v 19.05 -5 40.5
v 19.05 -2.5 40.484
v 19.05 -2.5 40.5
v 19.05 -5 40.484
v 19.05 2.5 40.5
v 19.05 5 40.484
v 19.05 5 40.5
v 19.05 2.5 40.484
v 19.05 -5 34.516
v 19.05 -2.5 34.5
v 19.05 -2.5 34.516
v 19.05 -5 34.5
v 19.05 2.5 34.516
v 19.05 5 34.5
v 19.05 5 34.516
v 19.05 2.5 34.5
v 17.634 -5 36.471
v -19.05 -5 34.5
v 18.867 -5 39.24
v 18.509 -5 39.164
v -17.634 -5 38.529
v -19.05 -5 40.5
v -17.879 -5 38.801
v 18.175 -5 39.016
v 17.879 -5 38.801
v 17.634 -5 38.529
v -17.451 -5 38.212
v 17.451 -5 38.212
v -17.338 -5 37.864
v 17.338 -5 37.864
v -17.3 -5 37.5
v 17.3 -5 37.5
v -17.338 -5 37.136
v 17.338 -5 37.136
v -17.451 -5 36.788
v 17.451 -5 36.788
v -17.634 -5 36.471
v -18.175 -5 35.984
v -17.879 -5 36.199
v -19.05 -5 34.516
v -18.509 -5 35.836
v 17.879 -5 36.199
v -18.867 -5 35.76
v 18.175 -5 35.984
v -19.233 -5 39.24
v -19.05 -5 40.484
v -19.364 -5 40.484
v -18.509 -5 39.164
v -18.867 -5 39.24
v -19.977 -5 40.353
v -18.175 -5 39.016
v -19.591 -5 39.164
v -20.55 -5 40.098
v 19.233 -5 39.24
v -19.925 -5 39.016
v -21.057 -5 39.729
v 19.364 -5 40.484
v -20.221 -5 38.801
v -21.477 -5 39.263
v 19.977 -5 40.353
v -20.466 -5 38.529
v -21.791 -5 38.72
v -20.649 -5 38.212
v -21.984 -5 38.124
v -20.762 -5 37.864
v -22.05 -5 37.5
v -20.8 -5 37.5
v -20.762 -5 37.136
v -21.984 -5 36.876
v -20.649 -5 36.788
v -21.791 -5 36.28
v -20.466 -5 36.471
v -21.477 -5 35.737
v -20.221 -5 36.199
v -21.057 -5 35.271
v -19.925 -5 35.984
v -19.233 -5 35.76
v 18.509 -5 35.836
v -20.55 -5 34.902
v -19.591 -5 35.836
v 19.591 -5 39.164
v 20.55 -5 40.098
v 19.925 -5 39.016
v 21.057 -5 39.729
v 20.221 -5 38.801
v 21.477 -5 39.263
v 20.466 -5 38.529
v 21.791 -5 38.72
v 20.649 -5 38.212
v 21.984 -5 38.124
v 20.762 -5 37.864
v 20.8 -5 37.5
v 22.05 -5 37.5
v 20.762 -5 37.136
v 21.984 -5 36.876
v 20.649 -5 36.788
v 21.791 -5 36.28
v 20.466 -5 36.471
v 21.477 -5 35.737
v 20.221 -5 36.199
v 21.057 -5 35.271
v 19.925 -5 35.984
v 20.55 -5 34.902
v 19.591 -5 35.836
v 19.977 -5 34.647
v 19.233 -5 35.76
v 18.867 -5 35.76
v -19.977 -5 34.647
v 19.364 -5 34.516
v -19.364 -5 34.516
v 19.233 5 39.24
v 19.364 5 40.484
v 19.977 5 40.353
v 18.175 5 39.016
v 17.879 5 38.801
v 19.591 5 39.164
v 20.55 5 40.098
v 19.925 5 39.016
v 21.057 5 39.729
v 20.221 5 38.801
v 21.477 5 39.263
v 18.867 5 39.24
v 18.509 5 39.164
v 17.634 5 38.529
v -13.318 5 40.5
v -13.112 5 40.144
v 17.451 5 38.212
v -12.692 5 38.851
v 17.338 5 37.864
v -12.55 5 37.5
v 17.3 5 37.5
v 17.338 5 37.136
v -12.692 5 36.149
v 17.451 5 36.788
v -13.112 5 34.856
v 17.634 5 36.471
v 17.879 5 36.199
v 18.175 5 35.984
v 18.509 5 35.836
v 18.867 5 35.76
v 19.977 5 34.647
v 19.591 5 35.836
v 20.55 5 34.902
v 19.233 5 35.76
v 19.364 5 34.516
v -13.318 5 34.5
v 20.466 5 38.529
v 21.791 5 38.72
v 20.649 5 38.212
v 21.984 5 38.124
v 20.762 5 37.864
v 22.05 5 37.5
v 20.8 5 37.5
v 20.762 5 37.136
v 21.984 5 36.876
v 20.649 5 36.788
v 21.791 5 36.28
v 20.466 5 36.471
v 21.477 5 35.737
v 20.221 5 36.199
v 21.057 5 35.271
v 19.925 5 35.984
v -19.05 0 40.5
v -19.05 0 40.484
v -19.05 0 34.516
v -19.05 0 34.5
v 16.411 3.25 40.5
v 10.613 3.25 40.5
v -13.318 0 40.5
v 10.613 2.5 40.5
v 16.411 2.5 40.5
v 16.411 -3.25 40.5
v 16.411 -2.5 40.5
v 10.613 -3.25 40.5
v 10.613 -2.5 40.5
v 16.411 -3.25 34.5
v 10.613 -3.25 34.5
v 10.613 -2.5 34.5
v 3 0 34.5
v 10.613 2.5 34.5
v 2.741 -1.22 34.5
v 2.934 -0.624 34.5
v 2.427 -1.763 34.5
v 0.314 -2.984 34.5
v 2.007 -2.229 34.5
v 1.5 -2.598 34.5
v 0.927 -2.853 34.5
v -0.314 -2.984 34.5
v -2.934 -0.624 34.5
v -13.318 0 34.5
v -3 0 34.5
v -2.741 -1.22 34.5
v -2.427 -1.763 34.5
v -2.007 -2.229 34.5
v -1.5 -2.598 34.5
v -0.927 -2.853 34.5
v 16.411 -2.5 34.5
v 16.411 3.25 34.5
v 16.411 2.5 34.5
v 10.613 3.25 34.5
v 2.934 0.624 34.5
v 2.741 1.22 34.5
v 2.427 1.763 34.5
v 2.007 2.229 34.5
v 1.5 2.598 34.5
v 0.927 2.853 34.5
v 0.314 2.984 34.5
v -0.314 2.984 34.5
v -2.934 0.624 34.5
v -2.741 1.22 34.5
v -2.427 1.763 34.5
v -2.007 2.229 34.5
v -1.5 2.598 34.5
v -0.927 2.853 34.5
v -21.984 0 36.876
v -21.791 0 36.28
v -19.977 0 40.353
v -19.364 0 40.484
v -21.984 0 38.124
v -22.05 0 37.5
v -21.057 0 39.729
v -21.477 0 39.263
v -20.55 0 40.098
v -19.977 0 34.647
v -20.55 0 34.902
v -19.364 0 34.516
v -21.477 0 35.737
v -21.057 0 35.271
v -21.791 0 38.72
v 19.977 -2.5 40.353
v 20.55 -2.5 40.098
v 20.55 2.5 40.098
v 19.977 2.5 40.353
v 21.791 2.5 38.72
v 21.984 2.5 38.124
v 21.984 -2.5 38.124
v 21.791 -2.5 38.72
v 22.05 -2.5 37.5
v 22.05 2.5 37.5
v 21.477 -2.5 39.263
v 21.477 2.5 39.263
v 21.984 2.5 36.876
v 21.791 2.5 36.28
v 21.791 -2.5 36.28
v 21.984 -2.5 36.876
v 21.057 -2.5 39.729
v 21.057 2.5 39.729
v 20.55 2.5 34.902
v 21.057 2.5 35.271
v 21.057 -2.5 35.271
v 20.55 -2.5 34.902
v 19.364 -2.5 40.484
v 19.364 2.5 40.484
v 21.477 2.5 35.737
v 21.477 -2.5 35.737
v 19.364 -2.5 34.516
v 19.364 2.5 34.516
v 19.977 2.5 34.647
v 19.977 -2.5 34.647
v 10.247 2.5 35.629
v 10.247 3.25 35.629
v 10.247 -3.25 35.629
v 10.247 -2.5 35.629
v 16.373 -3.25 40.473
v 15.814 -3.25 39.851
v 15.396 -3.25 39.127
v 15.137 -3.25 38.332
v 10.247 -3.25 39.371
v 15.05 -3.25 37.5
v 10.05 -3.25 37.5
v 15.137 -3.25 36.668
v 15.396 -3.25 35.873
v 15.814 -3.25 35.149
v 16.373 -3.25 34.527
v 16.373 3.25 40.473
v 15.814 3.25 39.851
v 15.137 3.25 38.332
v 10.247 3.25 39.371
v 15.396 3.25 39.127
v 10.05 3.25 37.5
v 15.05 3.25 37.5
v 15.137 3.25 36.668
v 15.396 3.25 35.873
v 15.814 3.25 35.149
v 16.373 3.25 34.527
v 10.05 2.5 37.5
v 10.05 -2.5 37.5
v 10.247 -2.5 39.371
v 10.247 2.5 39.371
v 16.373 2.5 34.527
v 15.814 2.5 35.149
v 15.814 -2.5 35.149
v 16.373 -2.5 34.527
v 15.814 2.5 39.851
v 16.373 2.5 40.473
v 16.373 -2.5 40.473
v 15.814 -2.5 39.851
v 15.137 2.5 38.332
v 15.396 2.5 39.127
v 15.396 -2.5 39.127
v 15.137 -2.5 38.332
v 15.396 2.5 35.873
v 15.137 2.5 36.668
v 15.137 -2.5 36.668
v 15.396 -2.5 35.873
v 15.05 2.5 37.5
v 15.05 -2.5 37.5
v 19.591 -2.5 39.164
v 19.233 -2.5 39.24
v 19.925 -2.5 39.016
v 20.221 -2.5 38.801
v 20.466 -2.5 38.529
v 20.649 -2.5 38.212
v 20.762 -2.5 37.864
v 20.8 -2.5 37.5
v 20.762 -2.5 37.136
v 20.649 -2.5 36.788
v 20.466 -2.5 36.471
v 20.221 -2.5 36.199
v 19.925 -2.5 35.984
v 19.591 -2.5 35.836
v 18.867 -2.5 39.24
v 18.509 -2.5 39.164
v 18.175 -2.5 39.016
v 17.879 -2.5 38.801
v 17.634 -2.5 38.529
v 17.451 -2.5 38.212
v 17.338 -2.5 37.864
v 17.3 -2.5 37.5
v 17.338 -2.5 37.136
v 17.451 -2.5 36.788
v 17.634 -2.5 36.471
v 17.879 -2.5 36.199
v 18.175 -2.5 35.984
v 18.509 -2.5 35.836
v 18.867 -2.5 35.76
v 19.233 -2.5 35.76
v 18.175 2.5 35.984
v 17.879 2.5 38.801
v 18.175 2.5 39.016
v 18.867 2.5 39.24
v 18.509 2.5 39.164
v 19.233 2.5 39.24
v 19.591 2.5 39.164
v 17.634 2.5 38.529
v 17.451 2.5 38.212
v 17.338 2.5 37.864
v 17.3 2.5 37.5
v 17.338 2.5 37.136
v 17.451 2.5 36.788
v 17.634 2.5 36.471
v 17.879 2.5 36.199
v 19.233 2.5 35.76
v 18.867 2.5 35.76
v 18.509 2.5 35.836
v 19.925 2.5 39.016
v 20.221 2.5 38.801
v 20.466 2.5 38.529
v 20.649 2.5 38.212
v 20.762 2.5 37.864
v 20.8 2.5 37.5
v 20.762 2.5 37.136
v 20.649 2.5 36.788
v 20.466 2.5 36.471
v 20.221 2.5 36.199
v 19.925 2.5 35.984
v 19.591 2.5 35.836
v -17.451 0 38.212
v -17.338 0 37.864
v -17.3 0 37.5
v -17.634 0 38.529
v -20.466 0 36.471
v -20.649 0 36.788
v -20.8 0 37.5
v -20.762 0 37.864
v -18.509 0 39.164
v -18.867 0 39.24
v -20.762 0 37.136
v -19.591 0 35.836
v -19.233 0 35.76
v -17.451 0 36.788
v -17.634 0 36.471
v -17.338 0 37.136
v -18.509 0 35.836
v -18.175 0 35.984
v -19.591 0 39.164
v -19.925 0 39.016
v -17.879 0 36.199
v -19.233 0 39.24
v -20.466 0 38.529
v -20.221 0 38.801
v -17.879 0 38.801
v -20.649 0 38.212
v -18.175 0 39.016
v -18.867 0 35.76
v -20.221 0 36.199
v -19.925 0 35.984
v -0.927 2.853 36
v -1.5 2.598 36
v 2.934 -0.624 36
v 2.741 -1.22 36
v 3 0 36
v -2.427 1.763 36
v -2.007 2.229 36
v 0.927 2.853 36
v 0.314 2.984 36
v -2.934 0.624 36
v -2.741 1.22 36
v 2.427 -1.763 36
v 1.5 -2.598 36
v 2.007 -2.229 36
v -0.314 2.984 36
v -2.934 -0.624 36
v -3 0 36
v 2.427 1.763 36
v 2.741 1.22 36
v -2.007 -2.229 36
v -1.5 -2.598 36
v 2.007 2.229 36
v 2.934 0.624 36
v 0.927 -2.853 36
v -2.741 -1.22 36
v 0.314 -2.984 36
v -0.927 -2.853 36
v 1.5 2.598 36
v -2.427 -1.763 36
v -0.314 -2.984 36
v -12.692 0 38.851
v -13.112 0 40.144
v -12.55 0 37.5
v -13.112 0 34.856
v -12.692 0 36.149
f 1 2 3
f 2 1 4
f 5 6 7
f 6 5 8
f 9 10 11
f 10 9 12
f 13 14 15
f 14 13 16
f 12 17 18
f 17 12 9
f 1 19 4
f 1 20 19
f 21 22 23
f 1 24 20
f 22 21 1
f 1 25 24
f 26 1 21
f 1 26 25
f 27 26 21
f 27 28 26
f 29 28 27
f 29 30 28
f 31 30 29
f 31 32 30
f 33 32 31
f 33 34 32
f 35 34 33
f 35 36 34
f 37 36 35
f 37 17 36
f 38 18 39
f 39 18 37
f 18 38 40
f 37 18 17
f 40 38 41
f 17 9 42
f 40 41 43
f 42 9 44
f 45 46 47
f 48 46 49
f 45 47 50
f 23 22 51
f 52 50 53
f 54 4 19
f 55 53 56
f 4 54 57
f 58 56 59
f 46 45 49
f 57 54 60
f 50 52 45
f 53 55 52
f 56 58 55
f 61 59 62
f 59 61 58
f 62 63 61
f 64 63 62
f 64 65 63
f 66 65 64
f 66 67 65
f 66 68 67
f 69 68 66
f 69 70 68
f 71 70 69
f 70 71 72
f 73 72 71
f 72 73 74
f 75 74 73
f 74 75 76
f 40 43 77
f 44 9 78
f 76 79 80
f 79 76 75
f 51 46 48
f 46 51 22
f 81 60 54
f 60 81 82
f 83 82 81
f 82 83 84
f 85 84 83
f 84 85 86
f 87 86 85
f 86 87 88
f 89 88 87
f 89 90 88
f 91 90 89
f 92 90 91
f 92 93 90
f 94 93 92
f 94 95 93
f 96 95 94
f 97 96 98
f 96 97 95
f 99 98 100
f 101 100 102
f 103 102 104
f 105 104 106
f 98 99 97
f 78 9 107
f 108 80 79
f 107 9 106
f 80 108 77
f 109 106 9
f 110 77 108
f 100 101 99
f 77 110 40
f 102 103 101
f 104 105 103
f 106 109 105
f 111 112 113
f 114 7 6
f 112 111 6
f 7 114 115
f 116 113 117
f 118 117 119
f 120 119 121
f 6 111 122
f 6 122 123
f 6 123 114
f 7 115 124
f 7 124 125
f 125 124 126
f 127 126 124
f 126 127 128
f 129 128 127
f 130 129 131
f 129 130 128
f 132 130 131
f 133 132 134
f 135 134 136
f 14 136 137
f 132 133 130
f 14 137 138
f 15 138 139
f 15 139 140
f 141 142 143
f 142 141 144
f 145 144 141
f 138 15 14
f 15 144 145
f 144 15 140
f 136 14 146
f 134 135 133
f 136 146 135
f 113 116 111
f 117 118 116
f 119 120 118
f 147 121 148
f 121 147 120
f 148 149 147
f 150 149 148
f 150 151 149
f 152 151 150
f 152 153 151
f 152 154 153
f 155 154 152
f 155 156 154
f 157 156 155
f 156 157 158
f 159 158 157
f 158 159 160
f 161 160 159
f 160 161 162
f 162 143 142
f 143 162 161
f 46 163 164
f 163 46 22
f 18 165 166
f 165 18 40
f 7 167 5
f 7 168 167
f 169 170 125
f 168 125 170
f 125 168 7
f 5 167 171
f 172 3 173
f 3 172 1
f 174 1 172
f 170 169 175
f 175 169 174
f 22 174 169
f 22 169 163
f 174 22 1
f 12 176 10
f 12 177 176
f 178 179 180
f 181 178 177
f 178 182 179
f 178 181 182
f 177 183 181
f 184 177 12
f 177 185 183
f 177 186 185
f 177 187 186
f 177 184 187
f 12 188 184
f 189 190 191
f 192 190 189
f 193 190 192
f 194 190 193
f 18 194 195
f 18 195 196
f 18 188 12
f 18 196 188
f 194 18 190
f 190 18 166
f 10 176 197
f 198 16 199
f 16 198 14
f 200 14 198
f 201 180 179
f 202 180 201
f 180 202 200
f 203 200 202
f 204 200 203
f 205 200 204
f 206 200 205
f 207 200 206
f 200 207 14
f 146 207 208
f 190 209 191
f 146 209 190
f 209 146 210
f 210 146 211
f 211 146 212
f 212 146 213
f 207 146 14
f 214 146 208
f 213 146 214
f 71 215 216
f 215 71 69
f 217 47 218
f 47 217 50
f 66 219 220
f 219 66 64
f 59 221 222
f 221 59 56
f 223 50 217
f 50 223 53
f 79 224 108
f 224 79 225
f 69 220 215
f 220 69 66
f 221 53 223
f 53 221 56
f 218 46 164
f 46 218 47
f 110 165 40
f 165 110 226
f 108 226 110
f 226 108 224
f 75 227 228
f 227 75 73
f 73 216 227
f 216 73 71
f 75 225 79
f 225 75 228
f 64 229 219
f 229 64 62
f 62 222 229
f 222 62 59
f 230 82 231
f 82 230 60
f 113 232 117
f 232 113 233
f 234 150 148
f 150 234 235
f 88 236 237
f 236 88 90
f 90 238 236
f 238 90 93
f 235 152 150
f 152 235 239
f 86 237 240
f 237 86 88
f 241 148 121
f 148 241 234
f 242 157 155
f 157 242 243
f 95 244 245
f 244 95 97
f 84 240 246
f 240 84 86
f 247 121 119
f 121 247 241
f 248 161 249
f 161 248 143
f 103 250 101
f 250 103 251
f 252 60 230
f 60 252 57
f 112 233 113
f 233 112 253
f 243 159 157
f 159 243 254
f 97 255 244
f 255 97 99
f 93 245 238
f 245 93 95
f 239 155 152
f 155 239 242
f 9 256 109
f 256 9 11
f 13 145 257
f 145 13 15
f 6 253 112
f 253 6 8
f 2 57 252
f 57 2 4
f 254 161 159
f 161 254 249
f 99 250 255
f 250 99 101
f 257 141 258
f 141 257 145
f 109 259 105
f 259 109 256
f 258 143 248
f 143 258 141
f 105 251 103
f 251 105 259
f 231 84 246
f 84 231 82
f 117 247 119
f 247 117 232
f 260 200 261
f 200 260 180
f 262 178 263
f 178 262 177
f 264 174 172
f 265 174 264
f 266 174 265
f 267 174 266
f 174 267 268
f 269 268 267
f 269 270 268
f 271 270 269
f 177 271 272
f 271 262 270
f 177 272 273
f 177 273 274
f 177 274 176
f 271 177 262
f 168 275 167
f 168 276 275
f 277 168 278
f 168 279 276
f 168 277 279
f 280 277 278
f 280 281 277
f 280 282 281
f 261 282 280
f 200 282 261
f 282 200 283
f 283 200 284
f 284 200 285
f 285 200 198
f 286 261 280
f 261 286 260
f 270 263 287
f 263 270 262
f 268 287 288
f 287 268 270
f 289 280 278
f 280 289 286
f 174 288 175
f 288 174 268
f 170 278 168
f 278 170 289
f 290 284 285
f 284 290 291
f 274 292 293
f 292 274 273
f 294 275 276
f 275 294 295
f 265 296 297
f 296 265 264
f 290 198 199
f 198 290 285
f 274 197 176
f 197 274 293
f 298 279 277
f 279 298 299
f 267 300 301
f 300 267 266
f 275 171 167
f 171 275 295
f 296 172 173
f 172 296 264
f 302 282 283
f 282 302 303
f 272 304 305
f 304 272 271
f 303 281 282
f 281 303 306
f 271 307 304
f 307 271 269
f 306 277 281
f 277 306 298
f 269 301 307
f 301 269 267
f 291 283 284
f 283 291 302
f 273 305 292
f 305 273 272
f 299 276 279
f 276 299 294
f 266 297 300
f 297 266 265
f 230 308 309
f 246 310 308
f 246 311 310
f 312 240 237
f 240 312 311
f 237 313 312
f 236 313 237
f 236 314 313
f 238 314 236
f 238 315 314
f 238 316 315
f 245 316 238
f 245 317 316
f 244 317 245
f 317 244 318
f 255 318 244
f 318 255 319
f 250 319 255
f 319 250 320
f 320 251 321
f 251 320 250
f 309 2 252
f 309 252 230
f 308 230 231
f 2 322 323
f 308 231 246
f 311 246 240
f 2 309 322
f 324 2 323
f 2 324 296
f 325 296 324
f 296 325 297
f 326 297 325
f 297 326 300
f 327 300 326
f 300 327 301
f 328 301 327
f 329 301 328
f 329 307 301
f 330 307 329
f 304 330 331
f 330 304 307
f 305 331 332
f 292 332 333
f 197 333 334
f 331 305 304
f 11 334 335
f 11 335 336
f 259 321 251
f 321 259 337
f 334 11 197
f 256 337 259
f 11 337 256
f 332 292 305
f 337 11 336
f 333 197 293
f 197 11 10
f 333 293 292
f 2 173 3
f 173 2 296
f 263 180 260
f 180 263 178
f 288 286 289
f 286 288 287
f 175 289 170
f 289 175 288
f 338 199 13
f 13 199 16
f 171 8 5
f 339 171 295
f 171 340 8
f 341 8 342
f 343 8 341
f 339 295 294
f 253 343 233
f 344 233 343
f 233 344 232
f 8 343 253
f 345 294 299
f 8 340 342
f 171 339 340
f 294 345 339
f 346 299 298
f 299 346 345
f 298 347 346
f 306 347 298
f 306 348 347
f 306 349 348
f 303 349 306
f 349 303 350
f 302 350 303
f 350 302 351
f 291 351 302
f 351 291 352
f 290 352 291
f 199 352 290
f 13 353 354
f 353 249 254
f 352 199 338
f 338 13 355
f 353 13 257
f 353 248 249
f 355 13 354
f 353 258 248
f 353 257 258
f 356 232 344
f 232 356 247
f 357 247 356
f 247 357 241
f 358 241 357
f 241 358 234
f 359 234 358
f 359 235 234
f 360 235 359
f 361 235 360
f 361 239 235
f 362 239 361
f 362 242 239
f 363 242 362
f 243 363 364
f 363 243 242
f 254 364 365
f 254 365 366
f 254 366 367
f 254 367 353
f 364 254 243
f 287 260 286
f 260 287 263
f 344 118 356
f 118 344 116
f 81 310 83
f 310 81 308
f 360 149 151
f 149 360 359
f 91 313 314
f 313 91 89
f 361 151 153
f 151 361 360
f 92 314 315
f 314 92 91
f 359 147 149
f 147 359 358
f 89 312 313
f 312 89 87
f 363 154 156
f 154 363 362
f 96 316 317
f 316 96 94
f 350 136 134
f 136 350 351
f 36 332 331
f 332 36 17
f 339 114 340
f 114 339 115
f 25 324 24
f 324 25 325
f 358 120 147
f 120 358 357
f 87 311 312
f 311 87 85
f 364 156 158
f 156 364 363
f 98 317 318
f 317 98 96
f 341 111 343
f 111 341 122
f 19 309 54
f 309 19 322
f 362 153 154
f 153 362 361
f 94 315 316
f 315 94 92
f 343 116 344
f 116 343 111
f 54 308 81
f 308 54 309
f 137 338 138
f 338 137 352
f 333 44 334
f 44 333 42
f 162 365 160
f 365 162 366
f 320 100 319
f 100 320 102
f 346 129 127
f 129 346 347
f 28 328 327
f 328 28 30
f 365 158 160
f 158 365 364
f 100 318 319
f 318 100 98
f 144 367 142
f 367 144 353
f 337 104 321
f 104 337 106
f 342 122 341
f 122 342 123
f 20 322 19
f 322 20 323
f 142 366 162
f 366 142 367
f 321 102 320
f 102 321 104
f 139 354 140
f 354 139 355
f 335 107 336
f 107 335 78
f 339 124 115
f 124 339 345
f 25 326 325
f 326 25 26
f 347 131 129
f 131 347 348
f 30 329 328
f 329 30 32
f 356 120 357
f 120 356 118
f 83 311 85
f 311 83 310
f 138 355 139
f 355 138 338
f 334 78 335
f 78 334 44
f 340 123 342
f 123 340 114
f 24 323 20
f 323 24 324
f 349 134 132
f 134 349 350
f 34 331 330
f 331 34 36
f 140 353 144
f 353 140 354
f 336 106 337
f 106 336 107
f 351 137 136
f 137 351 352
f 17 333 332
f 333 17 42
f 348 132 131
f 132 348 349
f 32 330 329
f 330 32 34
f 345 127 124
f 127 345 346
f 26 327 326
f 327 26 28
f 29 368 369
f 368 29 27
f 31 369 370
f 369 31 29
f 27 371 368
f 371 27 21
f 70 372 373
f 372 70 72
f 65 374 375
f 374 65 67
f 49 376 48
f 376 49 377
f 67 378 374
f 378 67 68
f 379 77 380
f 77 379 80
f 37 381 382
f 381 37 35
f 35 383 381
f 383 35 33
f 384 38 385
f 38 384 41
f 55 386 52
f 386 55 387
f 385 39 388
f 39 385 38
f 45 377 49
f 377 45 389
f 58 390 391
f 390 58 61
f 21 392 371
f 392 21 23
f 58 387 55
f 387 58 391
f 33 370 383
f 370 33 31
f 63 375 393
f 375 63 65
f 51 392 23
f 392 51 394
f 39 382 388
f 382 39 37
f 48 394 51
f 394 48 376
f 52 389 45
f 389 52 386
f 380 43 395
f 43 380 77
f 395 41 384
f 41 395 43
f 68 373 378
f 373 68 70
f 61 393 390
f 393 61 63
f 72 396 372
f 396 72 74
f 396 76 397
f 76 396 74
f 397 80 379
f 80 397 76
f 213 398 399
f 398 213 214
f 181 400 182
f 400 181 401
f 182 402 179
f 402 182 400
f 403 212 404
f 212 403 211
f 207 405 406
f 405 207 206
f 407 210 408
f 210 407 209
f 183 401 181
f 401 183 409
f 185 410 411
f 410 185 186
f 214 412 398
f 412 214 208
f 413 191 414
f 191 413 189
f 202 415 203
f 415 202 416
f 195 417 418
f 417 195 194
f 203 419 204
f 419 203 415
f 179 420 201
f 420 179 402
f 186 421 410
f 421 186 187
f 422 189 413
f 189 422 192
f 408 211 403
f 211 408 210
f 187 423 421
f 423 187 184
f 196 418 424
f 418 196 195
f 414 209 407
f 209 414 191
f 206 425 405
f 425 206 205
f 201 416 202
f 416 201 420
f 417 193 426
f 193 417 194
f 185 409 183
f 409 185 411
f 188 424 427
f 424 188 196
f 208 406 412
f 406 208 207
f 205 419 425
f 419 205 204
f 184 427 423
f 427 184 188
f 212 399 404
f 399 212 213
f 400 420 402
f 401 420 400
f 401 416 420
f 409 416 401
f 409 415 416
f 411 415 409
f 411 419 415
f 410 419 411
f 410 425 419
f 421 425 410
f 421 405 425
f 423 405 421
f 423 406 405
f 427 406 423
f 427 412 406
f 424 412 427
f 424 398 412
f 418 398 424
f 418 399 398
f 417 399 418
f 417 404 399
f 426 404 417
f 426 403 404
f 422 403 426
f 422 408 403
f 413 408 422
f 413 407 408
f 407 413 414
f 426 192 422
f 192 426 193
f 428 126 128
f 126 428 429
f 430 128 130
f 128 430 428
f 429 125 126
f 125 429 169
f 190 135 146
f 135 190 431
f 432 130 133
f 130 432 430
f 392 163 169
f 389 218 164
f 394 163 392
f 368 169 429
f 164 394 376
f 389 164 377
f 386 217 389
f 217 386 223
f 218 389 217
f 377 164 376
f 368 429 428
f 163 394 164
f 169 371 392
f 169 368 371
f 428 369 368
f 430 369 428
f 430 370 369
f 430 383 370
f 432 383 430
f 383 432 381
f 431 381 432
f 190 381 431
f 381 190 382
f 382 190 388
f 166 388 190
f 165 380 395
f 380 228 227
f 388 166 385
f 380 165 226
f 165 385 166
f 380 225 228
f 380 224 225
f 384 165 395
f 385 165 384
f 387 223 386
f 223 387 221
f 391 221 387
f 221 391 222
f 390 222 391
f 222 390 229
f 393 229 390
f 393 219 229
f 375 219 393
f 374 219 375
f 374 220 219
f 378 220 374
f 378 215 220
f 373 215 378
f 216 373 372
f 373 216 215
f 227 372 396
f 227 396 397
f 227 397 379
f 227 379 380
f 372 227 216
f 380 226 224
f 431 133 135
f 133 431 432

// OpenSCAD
inch = 25.4;

L = 1.5 * inch;
H = 10;
W = 6;

// coil_spring.scad
// OpenSCAD parametric compression spring with "full-circle" end turns.
// Spec requested:
//   OD = 5mm
//   wire diameter = 0.6mm
//   free length = 10mm
//   6 coils (active) + one complete circle on each end (closed-ish end turns)
//
// Notes:
// - OpenSCAD has no native sweep-along-curve; this uses linear_extrude + twist
//   on an offset wire cross-section, which produces a true helical solid.
// - End “complete circles” are implemented as 1 full turn at each end with
//   very small axial advance ("end height") so they look/behave like closed ends.

$fn = 64;  // smoothness for the wire cross-section

module helix_turns(mean_r, wire_d, turns, height, slices_per_turn=60) {
    // A helix created by twisting an offset circle during extrusion.
    // mean_r: spring mean radius (centerline of wire)
    // wire_d: wire diameter
    // turns: number of full revolutions
    // height: axial height of this helix section
    // slices_per_turn: controls smoothness along the helix
    linear_extrude(
        height = height,
        twist  = turns * 360,
        slices = max(5, ceil(turns * slices_per_turn)),
        convexity = 10
    )
        translate([mean_r, 0, 0])
            circle(d = wire_d);
}

module coil_spring(
    OD = 5.0,
    wire_d = 0.6,
    free_len = 10.0,
    active_coils = 6,
    end_turns = 1,        // "complete circle on each end"
    end_height = 0.7      // axial height allotted to each end turn (mm)
) {
    // Derived geometry
    mean_r = (OD - wire_d) / 2;   // centerline radius of the wire

    // Ensure we don't go negative
    end_height = min(end_height, free_len/2 - 0.01);
    mid_height = free_len - 2 * end_height;

    // Middle section: active_coils turns over mid_height (sets the pitch)
    // Ends: end_turns turns over end_height (near-closed end loops)
    union() {
        // Bottom end loop
        helix_turns(mean_r, wire_d, end_turns, end_height);

        // Active coils
        translate([0, 0, end_height])
            helix_turns(mean_r, wire_d, active_coils, mid_height);

        // Top end loop
        translate([0, 0, end_height + mid_height])
            helix_turns(mean_r, wire_d, end_turns, end_height);
    }
}

// ---- Build the requested spring ----


module swingarm1(){
  difference(){
    union(){
      cube([L, W, H], center=true);
      translate([-L/2, 0, 0])cylinder(d=W, h=H, center=true, $fn=30);
      translate([L/2, 0, 0])cylinder(d=W, h=H, center=true, $fn=30);
    }
    translate([L/2, 0, 0])difference(){
      cylinder(d=18, h=6.5, center=true, $fn=30);
      cylinder(d=8, h=7.5, center=true, $fn=30);
    }
    translate([L/2, 0, 0])cylinder(d=18, h=5., center=true, $fn=30);
    translate([L/2, 0, 0])cylinder(d=3.5, h=H+2, center=true, $fn=30);
    translate([-L/2, 0, 0])cylinder(d=3.5, h=H+2, center=true, $fn=30);
    translate([0,-1.5,0])rotate([90,0,0])cylinder(d=6, h=10, $fn=30);
    translate([-L/2, 0, -3])cylinder(d=13, h=6, center=true, $fn=30);
  }
  //translate([0,-1,0])rotate([90,0,0])
  //  coil_spring(OD=5.0, wire_d=0.6, free_len=9.0, active_coils=6,
  //end_turns=1, end_height=0.7);
}

module bearing(){
  color("silver")difference(){
    cylinder(d=13, h=5);
    translate([0,0,-1])cylinder(d=4.6, h=7);
  }
}

module swingarm(){
  translate([0,37.5,0]){
    swingarm1();
    //translate([L/2, 0, -2.5])bearing();
  }
}
module base(){
  zz = 11.5;
  translate([0,37.5+2.55,0])
  difference(){
    union(){
      translate([0, -13, -10])rotate([45, 0,0])cube([9,15,15],center=true);
      translate([0,-8,0])rotate([90,0,0])cylinder(d=9, h=5);
      translate([-9/2,-12.5+2-5/2,-zz])difference()cube([9, 5, zz], center=false);
    }
    translate([0,.5, 0])rotate([90, 0, 0])cylinder(d=5.5, h=10);
    translate([0,0,-24])cube([100, 100, 20], center=true);
  }

}
module static_parts(){
  zz = 11.5;
  for(theta=[0,120,-120]){
    rotate([0,0,theta+27])base();
    //rotate([0,0,theta-3])translate([0,-2.5, -5])cube([25, 5, 5]);
    //rotate([0,0,theta+24.5])translate([0,-2.5, -5])cube([38, 5, 5]);
    rotate([0,0,theta+27.4])translate([42,-2.5, -zz])difference(){
      cylinder(d=12, h=zz);
      translate([0,0,-1])cylinder(d=3.5, h=22);
      translate([0,0,-15])cylinder(d=6.5, h=22);
    }
  }
}
module swingarms(){
  for(theta=[0,120,-120]){
    rotate([0,0,theta+27])swingarm();
  }
}
//static_parts();
rotate([90, 0, 0])swingarm();
